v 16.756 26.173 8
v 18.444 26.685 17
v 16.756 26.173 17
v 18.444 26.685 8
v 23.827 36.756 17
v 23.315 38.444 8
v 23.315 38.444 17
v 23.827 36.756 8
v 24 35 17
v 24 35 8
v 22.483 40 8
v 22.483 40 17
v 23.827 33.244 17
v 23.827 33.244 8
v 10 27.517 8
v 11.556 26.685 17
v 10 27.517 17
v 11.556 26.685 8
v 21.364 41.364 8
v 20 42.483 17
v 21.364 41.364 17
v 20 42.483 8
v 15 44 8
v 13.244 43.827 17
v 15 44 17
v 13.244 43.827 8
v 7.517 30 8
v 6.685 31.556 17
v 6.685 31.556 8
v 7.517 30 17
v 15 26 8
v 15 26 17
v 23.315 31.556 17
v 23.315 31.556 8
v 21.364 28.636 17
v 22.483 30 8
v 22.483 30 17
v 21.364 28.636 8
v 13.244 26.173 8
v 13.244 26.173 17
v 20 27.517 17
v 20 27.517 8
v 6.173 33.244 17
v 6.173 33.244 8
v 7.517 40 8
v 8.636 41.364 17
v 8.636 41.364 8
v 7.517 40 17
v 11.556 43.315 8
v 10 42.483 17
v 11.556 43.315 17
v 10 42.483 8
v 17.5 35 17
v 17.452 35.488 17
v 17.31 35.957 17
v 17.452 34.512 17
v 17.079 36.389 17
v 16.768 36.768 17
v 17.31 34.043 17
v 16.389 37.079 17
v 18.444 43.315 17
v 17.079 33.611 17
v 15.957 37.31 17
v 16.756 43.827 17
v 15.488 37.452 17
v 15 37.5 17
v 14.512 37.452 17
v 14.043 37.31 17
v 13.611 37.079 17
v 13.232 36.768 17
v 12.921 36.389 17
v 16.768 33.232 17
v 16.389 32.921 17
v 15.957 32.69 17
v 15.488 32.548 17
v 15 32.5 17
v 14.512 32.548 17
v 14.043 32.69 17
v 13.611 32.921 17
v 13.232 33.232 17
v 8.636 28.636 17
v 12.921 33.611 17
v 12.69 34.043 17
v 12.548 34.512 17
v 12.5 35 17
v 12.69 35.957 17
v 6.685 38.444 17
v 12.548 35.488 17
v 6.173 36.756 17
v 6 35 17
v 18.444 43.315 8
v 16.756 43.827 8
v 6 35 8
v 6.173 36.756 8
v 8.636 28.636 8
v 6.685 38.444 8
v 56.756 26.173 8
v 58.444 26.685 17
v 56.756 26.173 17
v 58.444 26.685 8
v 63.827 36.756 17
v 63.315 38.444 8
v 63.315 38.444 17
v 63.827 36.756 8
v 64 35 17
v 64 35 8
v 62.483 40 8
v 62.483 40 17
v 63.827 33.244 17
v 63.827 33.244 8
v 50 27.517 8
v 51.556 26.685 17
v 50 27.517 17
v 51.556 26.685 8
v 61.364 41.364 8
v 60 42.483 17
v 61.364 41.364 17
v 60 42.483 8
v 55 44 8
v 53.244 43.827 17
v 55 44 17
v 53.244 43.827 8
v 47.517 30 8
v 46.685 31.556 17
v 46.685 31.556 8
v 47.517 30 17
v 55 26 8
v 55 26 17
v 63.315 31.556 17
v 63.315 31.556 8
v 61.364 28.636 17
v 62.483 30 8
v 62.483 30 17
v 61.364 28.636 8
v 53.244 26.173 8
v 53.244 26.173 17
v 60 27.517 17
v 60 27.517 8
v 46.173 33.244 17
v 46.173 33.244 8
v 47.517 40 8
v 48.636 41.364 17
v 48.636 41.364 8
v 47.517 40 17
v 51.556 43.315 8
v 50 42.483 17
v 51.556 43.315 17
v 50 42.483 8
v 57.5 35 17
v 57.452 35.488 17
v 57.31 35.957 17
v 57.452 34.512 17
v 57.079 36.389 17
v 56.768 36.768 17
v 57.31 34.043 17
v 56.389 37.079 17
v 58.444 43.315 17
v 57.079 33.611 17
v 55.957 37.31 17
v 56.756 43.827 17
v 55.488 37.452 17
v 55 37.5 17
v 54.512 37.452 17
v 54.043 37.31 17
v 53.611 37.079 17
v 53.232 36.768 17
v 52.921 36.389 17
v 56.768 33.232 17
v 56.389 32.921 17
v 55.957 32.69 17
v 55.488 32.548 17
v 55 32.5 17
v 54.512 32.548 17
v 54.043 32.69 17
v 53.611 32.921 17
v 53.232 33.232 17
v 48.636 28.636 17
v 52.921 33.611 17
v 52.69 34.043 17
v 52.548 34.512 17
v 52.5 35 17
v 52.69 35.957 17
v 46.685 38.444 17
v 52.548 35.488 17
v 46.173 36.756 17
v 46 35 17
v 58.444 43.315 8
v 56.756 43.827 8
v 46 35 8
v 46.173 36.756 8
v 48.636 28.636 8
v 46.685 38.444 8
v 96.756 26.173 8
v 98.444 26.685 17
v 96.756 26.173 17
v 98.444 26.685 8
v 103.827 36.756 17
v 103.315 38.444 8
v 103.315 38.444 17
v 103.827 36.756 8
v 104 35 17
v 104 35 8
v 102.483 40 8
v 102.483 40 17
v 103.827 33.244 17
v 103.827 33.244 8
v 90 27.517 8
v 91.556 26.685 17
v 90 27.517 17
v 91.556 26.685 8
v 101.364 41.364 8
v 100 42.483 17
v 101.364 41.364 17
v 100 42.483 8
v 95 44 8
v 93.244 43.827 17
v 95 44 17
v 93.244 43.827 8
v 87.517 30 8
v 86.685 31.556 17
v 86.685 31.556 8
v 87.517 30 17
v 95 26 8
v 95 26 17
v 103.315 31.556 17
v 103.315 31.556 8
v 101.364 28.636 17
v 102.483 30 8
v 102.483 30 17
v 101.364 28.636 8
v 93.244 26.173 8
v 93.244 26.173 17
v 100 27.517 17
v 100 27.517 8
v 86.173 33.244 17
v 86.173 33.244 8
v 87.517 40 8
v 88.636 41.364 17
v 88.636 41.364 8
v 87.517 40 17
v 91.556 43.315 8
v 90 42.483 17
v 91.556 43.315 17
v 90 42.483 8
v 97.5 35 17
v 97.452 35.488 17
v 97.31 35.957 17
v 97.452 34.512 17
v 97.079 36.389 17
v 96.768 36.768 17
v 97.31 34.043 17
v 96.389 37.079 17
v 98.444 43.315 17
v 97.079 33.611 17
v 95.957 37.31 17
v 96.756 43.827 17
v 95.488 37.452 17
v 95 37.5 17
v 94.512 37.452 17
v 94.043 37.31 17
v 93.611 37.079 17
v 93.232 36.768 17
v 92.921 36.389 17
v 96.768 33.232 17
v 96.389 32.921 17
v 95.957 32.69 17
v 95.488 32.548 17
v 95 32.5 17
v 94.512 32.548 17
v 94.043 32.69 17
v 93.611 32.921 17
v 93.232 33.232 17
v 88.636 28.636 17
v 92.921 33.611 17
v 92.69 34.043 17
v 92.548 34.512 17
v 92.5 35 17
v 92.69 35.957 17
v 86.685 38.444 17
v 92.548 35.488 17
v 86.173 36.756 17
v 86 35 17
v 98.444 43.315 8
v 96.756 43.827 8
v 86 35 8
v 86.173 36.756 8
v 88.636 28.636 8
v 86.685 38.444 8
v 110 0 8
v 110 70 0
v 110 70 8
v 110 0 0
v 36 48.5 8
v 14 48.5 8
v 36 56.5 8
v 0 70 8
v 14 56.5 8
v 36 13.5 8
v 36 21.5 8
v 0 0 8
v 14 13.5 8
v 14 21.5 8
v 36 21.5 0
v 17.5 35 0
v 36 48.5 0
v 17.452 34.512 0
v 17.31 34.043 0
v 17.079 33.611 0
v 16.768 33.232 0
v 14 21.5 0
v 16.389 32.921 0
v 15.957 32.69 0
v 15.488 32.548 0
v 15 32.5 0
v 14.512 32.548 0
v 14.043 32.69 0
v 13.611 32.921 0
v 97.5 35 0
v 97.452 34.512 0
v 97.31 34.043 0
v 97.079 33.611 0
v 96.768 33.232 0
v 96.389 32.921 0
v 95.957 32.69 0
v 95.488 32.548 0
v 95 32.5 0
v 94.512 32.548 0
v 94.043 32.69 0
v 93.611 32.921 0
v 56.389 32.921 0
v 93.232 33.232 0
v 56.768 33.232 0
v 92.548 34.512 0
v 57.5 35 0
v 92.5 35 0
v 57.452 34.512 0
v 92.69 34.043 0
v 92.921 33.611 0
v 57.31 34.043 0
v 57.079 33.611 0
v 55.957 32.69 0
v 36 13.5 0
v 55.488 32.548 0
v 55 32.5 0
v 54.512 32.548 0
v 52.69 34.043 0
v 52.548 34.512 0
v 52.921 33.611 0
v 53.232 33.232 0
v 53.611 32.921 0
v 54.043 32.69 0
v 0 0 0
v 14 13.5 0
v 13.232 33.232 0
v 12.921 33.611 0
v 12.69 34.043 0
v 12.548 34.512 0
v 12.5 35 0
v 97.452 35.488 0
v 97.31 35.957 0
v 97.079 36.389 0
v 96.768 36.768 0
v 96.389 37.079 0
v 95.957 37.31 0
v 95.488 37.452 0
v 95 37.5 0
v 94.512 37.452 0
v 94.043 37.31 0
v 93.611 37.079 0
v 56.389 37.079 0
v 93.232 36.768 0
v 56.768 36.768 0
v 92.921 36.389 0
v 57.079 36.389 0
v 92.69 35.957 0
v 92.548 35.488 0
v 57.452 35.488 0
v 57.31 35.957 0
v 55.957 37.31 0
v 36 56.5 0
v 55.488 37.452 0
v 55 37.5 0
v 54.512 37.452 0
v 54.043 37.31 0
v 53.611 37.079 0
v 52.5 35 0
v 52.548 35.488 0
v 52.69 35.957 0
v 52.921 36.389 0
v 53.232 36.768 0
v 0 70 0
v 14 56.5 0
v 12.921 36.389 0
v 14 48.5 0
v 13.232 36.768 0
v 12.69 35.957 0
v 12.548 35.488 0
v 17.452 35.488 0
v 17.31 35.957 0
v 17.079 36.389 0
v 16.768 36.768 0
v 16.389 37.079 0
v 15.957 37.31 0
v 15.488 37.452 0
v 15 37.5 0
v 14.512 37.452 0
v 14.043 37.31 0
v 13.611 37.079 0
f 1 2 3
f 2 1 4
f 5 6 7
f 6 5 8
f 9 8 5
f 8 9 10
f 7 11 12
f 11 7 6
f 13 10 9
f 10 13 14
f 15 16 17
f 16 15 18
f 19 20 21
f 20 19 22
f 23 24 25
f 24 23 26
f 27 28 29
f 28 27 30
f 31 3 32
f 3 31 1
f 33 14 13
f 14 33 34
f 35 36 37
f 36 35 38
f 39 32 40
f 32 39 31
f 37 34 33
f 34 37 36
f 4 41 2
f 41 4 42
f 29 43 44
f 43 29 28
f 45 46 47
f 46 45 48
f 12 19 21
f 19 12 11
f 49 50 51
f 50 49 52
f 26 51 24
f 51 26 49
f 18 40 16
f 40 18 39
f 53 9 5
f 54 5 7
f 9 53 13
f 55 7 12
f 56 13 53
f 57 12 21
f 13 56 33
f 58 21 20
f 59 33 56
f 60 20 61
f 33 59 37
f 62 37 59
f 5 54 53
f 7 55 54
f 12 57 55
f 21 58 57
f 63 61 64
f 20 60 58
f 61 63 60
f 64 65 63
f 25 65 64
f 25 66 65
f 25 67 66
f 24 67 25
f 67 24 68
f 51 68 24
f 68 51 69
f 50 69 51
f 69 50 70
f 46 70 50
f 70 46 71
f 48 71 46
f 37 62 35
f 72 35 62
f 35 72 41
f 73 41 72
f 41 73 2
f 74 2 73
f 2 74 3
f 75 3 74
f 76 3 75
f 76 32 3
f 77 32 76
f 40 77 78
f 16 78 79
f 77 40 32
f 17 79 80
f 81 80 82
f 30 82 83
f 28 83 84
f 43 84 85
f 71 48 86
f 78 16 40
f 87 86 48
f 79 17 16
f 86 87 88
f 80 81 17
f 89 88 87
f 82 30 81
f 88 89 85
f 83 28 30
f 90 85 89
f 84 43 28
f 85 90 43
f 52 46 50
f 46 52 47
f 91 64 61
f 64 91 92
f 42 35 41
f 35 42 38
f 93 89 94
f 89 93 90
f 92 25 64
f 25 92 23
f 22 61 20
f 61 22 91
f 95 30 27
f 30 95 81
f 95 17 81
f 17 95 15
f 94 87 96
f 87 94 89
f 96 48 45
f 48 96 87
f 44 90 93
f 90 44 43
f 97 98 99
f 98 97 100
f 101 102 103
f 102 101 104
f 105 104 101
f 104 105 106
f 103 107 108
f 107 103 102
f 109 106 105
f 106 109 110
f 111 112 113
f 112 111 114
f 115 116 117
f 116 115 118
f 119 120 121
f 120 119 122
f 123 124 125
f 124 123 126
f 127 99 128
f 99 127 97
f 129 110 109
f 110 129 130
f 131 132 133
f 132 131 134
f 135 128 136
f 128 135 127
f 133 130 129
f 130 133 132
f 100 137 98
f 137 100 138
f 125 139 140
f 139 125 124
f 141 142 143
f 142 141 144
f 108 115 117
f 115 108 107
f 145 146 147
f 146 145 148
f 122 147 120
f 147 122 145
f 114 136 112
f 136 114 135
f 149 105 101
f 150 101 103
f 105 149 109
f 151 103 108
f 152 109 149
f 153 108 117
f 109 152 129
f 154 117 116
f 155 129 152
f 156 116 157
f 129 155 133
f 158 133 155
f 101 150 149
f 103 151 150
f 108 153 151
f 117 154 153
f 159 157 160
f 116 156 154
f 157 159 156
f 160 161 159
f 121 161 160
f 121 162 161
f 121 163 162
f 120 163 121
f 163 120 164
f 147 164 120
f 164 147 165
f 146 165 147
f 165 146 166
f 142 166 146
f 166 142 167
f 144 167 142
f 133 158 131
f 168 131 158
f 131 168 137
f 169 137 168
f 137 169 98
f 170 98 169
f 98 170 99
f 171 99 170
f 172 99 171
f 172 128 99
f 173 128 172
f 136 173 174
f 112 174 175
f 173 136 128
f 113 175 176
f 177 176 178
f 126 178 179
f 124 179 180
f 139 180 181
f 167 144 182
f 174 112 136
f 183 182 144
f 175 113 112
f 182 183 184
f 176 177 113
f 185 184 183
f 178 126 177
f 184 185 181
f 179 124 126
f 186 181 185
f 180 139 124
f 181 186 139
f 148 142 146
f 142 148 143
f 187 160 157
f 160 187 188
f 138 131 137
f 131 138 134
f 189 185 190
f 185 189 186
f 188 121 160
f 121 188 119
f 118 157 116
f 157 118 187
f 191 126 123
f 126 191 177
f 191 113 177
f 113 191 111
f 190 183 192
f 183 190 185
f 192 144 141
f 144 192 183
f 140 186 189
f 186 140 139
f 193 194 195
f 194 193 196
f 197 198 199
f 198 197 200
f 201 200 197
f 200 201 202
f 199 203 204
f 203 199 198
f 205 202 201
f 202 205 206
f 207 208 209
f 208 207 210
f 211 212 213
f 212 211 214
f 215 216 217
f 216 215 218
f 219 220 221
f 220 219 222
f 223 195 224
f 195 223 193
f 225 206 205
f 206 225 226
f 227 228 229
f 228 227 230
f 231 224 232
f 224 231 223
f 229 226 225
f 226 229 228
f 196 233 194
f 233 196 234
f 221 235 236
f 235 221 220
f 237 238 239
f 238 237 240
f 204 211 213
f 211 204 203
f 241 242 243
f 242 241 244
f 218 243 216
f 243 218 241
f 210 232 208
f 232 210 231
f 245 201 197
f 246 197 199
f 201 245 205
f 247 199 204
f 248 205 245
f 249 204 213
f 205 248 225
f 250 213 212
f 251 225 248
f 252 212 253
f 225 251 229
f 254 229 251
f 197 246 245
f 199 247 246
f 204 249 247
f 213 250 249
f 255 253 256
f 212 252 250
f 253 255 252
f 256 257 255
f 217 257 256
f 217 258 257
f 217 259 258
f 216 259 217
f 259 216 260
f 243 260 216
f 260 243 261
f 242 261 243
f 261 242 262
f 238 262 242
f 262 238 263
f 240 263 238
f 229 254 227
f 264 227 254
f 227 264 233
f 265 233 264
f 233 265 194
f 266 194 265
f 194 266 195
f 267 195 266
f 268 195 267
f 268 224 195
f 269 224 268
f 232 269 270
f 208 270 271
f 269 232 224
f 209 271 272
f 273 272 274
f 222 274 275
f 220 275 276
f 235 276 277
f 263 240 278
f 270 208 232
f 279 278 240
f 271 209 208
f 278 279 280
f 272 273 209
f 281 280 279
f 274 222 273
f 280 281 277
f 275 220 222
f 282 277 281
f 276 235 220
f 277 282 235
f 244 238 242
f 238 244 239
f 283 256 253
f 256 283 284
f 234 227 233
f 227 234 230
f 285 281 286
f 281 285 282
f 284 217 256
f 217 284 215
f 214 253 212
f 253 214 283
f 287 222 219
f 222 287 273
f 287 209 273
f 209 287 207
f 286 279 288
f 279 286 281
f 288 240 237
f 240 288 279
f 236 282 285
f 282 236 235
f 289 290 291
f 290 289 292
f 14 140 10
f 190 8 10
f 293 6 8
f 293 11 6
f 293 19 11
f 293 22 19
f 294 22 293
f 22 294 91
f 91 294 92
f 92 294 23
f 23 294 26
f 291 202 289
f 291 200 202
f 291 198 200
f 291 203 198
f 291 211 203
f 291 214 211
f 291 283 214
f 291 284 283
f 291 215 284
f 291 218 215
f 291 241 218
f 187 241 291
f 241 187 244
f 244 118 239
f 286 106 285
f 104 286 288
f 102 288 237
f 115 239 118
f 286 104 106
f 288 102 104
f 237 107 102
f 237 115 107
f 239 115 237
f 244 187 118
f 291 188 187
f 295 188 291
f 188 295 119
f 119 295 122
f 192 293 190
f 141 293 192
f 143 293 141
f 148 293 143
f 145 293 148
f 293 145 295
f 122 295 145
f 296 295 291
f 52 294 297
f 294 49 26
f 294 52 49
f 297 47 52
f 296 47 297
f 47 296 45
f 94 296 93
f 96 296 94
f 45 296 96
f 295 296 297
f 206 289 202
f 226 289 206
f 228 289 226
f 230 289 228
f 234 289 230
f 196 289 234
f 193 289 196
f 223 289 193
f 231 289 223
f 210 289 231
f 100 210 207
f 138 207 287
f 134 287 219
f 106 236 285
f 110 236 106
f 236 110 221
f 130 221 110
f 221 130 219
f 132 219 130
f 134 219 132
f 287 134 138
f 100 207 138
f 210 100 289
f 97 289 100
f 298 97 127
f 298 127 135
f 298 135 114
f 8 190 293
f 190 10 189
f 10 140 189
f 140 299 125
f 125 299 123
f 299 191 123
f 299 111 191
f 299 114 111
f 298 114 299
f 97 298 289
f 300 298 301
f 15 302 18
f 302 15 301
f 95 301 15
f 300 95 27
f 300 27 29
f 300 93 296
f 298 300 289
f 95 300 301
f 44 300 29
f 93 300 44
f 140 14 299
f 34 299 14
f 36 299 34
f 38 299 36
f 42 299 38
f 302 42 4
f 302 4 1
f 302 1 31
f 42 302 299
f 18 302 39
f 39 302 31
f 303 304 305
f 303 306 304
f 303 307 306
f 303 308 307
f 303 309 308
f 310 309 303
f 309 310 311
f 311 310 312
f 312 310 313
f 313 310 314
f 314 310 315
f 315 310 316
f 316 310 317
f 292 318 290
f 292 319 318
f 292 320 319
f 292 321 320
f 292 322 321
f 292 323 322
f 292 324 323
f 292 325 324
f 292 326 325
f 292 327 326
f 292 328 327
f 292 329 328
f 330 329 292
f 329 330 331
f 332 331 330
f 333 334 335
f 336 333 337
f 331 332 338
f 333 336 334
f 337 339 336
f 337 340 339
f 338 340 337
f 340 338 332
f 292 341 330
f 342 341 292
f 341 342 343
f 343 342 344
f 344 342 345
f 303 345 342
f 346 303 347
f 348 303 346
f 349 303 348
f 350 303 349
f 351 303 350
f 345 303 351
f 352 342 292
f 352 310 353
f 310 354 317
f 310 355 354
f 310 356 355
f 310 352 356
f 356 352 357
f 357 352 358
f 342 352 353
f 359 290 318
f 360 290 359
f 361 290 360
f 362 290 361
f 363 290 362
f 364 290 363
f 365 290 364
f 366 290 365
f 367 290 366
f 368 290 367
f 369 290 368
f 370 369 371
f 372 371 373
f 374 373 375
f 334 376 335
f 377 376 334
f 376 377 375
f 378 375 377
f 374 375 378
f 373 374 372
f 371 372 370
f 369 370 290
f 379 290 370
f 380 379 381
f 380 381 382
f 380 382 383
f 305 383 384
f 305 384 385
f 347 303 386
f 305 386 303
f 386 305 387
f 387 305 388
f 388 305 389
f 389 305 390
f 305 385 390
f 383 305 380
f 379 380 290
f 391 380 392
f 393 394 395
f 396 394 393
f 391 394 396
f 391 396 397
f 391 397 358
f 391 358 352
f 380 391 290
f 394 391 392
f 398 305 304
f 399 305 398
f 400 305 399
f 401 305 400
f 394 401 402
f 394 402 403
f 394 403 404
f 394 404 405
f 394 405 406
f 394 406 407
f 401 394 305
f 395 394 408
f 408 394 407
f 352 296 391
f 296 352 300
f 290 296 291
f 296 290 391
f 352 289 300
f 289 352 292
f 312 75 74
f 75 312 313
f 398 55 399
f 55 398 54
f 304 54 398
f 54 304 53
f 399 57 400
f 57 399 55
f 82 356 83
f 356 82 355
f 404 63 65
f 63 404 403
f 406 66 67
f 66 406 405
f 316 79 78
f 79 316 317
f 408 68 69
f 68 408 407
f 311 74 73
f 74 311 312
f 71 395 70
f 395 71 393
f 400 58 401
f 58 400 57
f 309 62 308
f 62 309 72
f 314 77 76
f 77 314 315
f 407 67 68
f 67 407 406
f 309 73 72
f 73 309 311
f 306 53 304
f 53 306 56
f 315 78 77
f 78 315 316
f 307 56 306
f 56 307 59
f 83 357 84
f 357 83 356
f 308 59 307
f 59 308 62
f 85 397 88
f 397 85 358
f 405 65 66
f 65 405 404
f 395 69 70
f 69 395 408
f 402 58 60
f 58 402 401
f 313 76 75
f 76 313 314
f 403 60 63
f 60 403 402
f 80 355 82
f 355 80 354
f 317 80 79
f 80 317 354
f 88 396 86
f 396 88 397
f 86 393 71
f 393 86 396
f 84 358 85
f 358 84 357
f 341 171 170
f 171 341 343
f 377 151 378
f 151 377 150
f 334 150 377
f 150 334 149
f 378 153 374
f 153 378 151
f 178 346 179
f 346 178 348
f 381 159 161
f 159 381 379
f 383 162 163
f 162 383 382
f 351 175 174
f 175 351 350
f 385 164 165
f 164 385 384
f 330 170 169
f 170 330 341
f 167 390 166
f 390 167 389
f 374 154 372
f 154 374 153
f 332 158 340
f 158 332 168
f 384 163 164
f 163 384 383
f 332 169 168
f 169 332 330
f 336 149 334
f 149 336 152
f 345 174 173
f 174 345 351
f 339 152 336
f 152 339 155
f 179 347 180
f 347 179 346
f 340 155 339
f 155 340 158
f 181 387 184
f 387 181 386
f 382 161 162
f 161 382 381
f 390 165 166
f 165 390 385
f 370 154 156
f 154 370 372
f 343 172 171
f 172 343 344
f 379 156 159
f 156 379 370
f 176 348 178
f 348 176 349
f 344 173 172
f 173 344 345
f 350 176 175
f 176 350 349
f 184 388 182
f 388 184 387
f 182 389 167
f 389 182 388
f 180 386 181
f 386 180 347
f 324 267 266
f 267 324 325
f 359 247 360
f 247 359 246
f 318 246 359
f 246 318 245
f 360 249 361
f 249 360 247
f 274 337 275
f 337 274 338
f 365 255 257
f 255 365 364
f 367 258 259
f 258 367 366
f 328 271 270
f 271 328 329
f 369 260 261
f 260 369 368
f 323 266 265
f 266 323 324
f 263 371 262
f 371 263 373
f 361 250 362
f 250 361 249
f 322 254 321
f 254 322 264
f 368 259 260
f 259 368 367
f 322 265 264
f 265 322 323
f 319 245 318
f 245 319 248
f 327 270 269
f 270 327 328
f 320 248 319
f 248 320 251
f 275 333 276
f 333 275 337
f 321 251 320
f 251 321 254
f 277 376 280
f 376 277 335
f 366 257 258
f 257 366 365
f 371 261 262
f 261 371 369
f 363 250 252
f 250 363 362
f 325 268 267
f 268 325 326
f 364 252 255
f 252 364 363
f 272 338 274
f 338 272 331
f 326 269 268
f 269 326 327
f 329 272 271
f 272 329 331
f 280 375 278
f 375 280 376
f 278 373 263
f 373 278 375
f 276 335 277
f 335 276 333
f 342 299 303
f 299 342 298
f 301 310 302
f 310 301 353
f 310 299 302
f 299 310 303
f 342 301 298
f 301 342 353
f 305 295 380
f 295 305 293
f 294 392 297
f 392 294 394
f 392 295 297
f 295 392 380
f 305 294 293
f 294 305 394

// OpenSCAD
$fn = 32;

// ----------------------------------------------------------------------
// Drill jig: three_boss_slot jig
// ----------------------------------------------------------------------

// --- parameters (mm) ---
plate_l = 110;            // plate length, X
plate_w = 70;             // plate width, Y
plate_t = 8;              // plate thickness
boss_d = 18;              // guide boss diameter
boss_h = 10;              // boss height above the plate
guide_d = 5;              // guide hole diameter
boss_pitch = 40;          // boss pitch
slot_w = 8;               // clamp slot width
slot_l = 22;              // clamp slot length
slot_x = 14;              // slot start X

n_boss = 3;  // guide bosses
boss_x0 = (plate_l - (n_boss - 1) * boss_pitch) / 2;  // first boss X
boss_top = plate_t - 1 + boss_h;  // boss crown height
total_h = boss_top;  // overall height

difference() {
  union() {
  cube([plate_l, plate_w, plate_t]);
  for (i = [0 : n_boss - 1])
    translate([boss_x0 + i * boss_pitch, plate_w / 2, plate_t - 1])
      cylinder(h = boss_h, d = boss_d);
  }
  for (i = [0 : n_boss - 1])
    translate([boss_x0 + i * boss_pitch, plate_w / 2, -1])
      cylinder(h = plate_t + boss_h, d = guide_d);
  for (cy = [plate_w * 0.25, plate_w * 0.75])
    translate([slot_x, cy - slot_w / 2, -1])
      cube([slot_l, slot_w, plate_t + 2]);
}
